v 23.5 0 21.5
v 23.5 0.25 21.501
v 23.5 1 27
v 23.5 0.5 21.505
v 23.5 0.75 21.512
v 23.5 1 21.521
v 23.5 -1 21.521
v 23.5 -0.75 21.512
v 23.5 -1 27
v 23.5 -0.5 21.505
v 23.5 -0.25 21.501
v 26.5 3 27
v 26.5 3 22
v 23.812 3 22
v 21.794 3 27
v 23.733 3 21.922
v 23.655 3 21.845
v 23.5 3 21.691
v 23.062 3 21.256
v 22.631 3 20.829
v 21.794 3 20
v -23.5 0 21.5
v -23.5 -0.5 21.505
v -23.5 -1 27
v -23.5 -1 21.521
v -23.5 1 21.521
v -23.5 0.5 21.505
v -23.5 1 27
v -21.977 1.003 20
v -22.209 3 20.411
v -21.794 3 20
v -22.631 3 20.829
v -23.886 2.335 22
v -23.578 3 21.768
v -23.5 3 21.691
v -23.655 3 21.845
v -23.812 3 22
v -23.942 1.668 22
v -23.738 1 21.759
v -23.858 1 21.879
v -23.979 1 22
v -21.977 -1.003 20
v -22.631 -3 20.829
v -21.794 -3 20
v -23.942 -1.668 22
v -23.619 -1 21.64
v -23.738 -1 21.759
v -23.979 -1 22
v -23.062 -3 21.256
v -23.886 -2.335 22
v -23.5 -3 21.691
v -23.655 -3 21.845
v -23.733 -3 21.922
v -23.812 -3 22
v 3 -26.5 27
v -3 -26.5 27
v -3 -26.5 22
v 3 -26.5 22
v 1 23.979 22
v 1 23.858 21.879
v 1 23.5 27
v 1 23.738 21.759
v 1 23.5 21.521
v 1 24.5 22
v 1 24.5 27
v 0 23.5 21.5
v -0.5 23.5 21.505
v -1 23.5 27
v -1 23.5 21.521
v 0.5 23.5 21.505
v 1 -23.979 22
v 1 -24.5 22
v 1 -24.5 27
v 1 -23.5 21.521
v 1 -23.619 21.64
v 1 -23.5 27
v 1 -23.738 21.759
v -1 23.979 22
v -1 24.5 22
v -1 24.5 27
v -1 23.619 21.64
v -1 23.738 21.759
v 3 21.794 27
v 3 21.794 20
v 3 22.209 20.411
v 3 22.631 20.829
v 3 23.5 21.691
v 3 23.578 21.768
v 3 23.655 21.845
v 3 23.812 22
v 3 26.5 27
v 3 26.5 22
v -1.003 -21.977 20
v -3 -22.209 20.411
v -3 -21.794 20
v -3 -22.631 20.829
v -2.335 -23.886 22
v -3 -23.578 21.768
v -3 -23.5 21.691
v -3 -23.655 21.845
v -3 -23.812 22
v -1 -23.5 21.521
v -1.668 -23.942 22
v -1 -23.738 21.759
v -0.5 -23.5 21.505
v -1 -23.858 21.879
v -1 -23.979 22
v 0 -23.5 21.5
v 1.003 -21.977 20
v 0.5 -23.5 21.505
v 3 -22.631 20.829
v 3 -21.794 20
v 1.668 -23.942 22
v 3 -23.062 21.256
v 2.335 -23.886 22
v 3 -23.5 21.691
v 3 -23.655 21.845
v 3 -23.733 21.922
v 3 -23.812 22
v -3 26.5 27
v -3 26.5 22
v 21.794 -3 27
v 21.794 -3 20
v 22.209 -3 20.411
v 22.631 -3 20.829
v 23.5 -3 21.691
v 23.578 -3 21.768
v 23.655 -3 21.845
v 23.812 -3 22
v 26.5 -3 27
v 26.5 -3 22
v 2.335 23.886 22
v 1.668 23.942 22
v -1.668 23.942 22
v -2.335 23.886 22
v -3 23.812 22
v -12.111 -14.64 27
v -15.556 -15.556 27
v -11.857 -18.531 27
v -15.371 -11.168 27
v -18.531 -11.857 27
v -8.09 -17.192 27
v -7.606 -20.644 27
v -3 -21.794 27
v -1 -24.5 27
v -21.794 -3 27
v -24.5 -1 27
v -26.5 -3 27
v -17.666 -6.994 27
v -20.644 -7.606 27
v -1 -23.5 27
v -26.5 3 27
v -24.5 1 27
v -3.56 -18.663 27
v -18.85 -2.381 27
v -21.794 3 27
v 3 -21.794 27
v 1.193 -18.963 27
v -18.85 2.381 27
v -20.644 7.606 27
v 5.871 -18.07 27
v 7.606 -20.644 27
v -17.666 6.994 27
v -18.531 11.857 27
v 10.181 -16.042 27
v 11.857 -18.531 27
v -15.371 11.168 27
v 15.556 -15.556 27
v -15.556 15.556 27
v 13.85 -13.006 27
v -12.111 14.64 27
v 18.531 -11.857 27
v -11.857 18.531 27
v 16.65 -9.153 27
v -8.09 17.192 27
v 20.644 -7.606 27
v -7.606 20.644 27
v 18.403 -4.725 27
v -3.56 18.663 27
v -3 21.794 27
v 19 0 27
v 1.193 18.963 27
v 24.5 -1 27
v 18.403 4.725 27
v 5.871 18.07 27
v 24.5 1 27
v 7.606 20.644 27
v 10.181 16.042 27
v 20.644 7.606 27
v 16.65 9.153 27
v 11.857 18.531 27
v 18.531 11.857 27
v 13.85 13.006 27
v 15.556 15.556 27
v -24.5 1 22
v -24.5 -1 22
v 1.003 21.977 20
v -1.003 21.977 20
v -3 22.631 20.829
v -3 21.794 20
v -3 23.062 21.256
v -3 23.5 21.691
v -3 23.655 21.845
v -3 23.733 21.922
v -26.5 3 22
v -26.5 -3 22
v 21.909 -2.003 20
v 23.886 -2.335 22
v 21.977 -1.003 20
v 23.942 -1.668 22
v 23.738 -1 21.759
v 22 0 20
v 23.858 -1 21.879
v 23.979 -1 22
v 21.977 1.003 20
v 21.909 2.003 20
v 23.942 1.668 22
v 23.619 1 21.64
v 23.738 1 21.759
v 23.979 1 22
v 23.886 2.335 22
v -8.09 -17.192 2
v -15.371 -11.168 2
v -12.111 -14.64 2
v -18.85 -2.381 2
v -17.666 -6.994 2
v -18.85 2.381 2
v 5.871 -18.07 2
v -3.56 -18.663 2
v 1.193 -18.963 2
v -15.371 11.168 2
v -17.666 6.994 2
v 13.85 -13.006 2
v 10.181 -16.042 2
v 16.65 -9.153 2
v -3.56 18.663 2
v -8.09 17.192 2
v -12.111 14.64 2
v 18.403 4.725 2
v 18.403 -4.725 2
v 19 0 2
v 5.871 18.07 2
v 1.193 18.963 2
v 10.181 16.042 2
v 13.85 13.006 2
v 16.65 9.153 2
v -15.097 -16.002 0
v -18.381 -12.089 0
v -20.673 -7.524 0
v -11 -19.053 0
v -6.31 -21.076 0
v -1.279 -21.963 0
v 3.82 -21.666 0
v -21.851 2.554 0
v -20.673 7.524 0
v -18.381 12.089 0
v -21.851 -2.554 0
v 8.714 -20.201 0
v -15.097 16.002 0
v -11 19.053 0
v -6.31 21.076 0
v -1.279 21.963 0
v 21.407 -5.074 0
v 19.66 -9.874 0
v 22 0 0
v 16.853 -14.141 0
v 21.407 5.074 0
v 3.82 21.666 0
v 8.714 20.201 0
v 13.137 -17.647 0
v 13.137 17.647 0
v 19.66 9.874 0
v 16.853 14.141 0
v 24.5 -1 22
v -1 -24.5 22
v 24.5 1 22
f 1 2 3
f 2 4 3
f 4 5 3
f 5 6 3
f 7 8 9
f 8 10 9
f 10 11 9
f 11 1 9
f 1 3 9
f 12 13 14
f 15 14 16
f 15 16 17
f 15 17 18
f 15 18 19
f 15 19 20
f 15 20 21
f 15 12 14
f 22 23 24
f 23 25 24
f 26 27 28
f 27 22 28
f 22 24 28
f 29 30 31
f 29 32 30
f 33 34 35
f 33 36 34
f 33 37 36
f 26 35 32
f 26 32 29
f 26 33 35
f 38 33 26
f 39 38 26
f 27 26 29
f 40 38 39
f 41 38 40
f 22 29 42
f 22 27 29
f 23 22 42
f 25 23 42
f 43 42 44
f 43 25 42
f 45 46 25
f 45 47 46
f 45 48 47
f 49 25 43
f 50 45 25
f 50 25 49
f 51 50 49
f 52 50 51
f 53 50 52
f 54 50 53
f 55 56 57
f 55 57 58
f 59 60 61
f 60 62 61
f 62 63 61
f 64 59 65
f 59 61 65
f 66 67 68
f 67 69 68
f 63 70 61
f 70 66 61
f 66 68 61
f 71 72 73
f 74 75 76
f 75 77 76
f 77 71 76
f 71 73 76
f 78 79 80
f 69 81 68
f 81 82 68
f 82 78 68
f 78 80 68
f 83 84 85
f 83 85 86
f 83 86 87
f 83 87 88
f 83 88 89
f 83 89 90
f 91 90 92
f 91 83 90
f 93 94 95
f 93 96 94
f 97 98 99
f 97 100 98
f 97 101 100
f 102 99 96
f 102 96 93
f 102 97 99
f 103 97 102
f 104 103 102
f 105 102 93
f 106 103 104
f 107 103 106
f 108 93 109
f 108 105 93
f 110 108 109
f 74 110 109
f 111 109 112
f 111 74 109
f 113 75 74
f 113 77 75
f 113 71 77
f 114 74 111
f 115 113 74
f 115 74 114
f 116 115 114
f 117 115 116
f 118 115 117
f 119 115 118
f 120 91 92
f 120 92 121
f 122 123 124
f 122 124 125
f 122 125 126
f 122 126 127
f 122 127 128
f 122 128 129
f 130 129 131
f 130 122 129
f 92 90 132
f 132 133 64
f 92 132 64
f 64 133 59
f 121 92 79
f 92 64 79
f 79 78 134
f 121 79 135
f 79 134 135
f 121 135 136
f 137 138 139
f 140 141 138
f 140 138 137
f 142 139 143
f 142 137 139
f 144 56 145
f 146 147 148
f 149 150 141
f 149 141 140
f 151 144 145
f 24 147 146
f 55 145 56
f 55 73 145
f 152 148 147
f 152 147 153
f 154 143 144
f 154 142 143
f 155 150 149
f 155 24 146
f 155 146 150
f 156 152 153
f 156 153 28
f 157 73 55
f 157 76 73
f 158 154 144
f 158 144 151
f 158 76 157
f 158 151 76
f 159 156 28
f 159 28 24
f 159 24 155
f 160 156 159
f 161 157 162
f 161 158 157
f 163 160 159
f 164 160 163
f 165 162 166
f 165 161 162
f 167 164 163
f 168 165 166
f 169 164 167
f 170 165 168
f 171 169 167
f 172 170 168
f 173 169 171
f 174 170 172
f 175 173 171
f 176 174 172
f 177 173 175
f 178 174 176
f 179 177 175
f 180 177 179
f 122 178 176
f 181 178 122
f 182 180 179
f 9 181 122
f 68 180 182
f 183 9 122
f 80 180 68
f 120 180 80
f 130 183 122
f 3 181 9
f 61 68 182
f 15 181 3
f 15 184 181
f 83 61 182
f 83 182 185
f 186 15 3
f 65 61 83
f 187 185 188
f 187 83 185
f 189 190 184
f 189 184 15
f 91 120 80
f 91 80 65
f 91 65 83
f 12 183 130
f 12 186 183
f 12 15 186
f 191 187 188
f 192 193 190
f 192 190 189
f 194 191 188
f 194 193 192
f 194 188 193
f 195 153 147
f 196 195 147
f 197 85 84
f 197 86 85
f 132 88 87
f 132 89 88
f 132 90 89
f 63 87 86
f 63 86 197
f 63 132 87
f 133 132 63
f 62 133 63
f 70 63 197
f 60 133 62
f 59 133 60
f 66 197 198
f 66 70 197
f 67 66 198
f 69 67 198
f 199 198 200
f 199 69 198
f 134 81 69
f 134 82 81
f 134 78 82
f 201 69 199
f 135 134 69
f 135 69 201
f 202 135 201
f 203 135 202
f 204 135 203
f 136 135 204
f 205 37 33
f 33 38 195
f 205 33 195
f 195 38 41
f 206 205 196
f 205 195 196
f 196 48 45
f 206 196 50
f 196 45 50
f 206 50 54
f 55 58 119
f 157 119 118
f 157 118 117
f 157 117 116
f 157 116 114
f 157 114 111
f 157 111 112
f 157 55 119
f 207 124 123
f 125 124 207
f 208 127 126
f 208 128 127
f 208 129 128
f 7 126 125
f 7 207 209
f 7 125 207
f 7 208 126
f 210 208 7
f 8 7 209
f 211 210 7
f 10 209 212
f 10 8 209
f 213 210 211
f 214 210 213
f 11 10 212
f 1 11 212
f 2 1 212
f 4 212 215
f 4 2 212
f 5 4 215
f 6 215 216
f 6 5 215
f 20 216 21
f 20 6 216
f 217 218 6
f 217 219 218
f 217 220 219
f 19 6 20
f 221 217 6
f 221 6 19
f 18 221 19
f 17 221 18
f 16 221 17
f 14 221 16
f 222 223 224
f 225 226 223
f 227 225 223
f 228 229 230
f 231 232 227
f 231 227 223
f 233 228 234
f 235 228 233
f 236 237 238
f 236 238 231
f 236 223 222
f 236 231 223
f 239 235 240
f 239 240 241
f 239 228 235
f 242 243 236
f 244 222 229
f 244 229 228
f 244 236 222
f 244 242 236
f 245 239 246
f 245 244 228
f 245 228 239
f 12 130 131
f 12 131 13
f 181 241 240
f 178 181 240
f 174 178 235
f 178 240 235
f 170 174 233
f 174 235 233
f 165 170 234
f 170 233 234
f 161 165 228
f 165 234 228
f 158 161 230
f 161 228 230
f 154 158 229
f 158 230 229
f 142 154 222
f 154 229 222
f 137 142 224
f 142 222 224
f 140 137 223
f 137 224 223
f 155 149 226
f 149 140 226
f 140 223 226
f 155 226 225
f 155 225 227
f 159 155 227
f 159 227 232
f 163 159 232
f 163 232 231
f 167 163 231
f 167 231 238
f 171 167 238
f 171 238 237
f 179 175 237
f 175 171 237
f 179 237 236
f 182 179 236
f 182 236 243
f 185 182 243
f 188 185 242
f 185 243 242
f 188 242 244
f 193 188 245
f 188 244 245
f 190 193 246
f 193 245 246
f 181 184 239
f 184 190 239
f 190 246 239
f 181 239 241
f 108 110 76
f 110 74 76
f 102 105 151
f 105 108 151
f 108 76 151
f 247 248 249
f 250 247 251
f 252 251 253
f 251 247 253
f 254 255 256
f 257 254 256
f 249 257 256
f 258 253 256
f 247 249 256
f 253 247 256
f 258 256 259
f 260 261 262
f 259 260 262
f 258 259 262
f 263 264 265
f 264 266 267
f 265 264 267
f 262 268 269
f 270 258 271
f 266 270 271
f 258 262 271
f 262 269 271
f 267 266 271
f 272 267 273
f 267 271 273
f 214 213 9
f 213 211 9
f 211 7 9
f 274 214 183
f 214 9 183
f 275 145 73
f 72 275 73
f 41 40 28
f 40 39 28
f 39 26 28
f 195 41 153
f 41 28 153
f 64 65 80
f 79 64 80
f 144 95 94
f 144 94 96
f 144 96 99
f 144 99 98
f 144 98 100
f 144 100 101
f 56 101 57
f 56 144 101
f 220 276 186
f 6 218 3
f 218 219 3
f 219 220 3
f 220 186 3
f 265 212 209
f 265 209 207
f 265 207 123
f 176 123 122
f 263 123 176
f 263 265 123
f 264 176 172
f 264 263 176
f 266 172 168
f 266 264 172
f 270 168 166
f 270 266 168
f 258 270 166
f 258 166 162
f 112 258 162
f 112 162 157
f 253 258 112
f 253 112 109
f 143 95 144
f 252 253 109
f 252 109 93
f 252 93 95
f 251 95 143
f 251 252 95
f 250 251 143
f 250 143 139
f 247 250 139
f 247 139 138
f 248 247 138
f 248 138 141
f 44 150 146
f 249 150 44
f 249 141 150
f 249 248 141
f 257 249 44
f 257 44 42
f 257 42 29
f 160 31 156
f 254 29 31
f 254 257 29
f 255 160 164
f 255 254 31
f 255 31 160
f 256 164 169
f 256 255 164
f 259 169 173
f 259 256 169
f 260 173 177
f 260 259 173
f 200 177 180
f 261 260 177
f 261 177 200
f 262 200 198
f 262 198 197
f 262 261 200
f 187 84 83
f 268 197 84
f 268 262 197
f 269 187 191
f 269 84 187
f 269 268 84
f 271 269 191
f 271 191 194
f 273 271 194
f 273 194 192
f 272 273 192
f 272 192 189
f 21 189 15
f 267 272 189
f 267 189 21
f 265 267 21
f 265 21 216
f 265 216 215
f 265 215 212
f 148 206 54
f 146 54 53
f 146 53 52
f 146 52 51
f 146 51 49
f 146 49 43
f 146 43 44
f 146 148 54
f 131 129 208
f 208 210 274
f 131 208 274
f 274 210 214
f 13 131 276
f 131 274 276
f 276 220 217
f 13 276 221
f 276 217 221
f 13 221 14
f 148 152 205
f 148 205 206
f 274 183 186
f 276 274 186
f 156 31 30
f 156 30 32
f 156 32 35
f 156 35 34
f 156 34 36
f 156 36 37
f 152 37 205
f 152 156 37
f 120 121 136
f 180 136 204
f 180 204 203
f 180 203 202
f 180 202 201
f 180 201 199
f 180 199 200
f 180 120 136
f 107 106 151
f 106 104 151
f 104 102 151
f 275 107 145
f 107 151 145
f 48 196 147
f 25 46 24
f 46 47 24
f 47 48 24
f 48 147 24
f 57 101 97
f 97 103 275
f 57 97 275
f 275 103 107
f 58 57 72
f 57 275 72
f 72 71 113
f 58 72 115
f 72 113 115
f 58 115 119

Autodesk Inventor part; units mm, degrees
ref_plane "YZ Plane" through (0, 0, 0) normal (1, 0, 0) x (0, 1, 0)
ref_plane "XZ Plane" through (0, 0, 0) normal (0, 1, 0) x (-1, 0, 0)
ref_plane "XY Plane" through (0, 0, 0) normal (0, 0, 1) x (1, 0, 0)
sketch "스케치1" plane through (0, 0, 0) normal (0, 0, 1) x (1, 0, 0)
  circle A0 centre (0, 0) radius 22
  dimension "d0" = 44
extrude "돌출1" add sketch "스케치1" along normal blind 2
sketch "스케치2" plane through (0, 0, 2) normal (0, 0, 1) x (1, 0, 0)
  circle A0 centre (0, 0) radius 22
  circle A1 centre (0, 0) radius 19
  circle A2 centre (0, 0) radius 22 projected
  dimension "d7" = 38
extrude "돌출2" add sketch "스케치2" along normal blind 25
sketch "스케치3" plane through (0, 0, 27) normal (0, 0, 1) x (1, 0, 0)
  line L0 (-3, -26.5) -> (3, -26.5)
  line L1 (3, -26.5) -> (3, -20.5)
  line L2 (3, -20.5) -> (-3, -20.5)
  line L3 (-3, -20.5) -> (-3, -26.5)
  circle A0 centre (0, 0) radius 19 construction
  line L4 (0, -19) -> (0, -22) construction
  circle A1 centre (0, 0) radius 22 construction
  line L5 (-1, -24.5) -> (1, -24.5)
  line L6 (1, -24.5) -> (1, -23.5)
  line L7 (1, -23.5) -> (-1, -23.5)
  line L8 (-1, -23.5) -> (-1, -24.5)
  point P0 (0, -20.5)
  point P1 (0, -23.5)
  dimension "d8" = 6
  dimension "d9" = 6
  dimension "d10" = 2
  dimension "d11" = 2
  dimension "d12" = 1
extrude "돌출3" add sketch "스케치3" against normal blind 5
chamfer "모따기1" distance 2 angle 45 1 edges at (0, -22, 22)
pattern_circular "원형 패턴1" count 4 over 360 about axis through (0, 0, 2) along (0, 0, 1) of "돌출3", "모따기1"
properties part number "_3D 인쇄"
